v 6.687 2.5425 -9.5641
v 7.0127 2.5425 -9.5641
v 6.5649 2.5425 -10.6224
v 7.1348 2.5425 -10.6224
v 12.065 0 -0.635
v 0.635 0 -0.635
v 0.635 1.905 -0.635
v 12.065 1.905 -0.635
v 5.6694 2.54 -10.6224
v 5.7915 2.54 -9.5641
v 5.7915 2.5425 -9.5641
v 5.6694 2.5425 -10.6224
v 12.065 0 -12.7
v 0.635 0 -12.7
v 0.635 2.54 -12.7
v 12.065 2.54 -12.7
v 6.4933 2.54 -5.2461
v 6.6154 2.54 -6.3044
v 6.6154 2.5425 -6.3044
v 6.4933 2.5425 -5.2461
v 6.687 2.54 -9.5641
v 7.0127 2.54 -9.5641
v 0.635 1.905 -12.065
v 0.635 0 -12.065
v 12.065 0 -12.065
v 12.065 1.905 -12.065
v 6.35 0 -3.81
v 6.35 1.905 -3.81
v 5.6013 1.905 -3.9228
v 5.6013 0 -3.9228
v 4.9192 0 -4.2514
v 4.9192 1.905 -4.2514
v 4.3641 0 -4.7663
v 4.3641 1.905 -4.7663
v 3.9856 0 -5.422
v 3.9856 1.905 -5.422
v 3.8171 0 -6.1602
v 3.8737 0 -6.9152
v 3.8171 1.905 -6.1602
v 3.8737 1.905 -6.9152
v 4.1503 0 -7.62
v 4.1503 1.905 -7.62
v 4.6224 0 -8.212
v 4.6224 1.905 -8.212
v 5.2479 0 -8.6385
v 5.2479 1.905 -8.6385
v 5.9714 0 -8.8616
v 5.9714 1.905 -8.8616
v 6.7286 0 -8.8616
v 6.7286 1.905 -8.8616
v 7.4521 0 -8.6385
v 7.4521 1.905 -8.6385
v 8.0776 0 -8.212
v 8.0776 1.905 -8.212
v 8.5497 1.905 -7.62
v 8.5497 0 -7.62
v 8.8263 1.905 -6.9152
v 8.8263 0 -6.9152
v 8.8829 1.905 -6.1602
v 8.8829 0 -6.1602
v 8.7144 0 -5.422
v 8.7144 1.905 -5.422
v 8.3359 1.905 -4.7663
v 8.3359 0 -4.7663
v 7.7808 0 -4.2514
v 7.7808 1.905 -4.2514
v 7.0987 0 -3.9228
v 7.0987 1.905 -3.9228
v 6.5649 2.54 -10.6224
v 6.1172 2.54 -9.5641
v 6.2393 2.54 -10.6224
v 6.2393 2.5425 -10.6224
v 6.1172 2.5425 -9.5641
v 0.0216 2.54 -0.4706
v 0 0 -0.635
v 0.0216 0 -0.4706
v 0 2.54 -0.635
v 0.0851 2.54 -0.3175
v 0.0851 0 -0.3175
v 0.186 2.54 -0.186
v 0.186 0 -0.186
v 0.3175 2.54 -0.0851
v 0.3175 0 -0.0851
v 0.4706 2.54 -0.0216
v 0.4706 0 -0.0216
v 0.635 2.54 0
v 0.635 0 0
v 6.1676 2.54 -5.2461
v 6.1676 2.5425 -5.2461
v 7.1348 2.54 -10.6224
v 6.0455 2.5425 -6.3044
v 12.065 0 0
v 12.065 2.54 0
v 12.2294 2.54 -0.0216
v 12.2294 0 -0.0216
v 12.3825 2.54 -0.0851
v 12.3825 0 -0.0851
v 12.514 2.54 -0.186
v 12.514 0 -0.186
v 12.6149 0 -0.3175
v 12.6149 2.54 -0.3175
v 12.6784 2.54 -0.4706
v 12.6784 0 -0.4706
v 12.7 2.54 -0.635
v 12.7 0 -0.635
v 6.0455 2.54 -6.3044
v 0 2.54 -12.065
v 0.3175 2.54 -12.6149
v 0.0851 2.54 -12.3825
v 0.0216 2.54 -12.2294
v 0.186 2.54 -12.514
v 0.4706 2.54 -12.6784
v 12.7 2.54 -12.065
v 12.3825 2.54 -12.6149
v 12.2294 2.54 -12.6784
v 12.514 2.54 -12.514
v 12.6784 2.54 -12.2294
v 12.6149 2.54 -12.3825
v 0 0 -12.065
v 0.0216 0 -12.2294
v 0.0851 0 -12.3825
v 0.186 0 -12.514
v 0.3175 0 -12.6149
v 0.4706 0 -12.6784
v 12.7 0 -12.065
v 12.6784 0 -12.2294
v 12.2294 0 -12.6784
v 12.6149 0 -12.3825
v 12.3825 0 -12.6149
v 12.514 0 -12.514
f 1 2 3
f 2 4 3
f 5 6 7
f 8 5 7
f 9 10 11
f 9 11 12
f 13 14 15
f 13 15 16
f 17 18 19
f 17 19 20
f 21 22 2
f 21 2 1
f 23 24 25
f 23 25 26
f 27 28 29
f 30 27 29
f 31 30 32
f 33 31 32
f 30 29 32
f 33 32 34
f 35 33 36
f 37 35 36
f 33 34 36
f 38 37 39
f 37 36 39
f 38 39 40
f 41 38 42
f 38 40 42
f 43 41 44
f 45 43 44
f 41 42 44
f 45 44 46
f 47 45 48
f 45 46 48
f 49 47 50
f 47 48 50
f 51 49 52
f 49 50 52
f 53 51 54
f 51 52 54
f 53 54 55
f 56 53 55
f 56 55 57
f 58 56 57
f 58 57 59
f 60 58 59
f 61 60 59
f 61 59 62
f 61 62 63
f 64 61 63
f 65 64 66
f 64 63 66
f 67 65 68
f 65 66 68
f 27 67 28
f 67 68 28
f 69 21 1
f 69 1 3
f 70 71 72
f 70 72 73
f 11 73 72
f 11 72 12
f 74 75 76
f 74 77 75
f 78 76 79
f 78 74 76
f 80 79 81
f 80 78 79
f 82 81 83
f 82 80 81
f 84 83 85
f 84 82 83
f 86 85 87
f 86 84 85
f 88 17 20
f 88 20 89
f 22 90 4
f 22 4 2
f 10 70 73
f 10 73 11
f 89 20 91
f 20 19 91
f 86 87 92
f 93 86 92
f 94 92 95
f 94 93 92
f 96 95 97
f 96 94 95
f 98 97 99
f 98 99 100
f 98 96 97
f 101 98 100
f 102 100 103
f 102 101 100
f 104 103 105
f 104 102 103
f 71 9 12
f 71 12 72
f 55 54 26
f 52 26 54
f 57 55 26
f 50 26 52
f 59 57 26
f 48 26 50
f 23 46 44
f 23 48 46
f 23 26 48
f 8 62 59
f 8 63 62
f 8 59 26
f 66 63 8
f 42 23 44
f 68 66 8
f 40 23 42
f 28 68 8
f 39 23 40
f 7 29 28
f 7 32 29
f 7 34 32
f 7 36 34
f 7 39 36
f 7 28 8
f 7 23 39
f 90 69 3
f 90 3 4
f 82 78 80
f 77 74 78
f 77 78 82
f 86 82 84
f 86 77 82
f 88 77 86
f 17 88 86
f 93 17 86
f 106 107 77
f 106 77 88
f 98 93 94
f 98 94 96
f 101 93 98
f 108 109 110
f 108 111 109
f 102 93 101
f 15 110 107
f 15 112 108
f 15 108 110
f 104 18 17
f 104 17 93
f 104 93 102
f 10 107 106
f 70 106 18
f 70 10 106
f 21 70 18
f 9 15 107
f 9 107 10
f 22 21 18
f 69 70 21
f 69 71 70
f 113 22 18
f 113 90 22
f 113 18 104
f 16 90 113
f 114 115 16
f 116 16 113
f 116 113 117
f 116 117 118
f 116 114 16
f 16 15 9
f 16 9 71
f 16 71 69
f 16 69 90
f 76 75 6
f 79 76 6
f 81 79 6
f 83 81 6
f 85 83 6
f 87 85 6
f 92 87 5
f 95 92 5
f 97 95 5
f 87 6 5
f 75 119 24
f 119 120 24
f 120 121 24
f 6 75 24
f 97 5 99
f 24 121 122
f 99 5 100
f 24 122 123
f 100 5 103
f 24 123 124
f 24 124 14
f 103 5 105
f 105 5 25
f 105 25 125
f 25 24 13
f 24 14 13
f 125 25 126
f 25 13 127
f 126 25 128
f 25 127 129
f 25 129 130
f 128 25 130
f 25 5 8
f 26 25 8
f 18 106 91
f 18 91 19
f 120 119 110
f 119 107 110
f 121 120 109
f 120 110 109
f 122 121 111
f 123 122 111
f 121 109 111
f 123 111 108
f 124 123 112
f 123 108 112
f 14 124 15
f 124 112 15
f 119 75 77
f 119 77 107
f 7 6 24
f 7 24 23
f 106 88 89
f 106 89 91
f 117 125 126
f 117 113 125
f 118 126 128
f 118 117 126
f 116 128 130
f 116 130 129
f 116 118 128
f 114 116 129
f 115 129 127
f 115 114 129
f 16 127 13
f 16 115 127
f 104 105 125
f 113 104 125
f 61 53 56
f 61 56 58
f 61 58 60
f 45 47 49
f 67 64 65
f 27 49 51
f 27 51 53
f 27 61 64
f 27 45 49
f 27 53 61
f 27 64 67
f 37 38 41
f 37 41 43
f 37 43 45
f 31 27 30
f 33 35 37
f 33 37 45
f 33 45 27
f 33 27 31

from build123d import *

# Parameters (mm, degrees)
SKETCH1_W           = 12.7
SKETCH1_H           = 12.7
BOSS_EXTRUDE1_DEPTH = 2.54
FILLET1_R           = 0.635
SHELL1_START        = 0.635
SHELL1_OUTLINE_W    = 1.905
SHELL1_OUTLINE_H    = 11.43
SHELL1_DEPTH        = 11.43
SKETCH2_R           = 2.54
BOSS_EXTRUDE2_DEPTH = 1.905
BOSS_EXTRUDE3_DEPTH = 0.00254


# Read off the part's stored shape, not the designer's step: Shell1
with BuildPart() as part:
    # Sketch1 → Boss-Extrude1 (new body)
    with BuildSketch(Plane(origin=(0, 0, 0), x_dir=(1, 0, 0), z_dir=(0, 1, 0))):
        with Locations((6.35, 6.35)):
            Rectangle(SKETCH1_W, SKETCH1_H)
    extrude(amount=BOSS_EXTRUDE1_DEPTH)

    # Fillet1
    fillet1_edges = [part.edges().sort_by_distance(p)[0] for p in [
        (0, 1.27, -12.7),
        (12.7, 1.27, -12.7),
        (12.7, 1.27, 0),
        (0, 1.27, 0),
    ]]
    fillet(fillet1_edges, radius=FILLET1_R)

    # Shell1 outline → Shell1 (cut)
    with BuildSketch(Plane.YZ.offset(SHELL1_START)):
        with Locations((0.9525, -6.35)):
            Rectangle(SHELL1_OUTLINE_W, SHELL1_OUTLINE_H)
    extrude(amount=SHELL1_DEPTH, mode=Mode.SUBTRACT)

    # Sketch2 → Boss-Extrude2 (add)
    with BuildSketch(Plane(origin=(0, 1.905, 0), x_dir=(-1, 0, 0), z_dir=(0, -1, 0))):
        with Locations(Location((-6.35, 6.35, 0), (0, 0, 270))):
            Circle(SKETCH2_R)
    extrude(amount=BOSS_EXTRUDE2_DEPTH)

    # Sketch3 → Boss-Extrude3 (add)
    with BuildSketch(Plane(origin=(0, 2.54, 0), x_dir=(1, 0, 0), z_dir=(0, 1, 0))):
        Polygon((7.012679487, 9.564076923), (6.687038462, 9.564076923), (6.564923077, 10.622410256), (7.134794872, 10.622410256), align=None)
        Polygon((6.117166667, 9.564076923), (5.791525641, 9.564076923), (5.669410256, 10.622410256), (6.239282051, 10.622410256), align=None)
        Polygon((6.493282051, 5.246076923), (6.167641026, 5.246076923), (6.045525641, 6.304410256), (6.615397436, 6.304410256), align=None)
    extrude(amount=BOSS_EXTRUDE3_DEPTH)


solid = part.part
